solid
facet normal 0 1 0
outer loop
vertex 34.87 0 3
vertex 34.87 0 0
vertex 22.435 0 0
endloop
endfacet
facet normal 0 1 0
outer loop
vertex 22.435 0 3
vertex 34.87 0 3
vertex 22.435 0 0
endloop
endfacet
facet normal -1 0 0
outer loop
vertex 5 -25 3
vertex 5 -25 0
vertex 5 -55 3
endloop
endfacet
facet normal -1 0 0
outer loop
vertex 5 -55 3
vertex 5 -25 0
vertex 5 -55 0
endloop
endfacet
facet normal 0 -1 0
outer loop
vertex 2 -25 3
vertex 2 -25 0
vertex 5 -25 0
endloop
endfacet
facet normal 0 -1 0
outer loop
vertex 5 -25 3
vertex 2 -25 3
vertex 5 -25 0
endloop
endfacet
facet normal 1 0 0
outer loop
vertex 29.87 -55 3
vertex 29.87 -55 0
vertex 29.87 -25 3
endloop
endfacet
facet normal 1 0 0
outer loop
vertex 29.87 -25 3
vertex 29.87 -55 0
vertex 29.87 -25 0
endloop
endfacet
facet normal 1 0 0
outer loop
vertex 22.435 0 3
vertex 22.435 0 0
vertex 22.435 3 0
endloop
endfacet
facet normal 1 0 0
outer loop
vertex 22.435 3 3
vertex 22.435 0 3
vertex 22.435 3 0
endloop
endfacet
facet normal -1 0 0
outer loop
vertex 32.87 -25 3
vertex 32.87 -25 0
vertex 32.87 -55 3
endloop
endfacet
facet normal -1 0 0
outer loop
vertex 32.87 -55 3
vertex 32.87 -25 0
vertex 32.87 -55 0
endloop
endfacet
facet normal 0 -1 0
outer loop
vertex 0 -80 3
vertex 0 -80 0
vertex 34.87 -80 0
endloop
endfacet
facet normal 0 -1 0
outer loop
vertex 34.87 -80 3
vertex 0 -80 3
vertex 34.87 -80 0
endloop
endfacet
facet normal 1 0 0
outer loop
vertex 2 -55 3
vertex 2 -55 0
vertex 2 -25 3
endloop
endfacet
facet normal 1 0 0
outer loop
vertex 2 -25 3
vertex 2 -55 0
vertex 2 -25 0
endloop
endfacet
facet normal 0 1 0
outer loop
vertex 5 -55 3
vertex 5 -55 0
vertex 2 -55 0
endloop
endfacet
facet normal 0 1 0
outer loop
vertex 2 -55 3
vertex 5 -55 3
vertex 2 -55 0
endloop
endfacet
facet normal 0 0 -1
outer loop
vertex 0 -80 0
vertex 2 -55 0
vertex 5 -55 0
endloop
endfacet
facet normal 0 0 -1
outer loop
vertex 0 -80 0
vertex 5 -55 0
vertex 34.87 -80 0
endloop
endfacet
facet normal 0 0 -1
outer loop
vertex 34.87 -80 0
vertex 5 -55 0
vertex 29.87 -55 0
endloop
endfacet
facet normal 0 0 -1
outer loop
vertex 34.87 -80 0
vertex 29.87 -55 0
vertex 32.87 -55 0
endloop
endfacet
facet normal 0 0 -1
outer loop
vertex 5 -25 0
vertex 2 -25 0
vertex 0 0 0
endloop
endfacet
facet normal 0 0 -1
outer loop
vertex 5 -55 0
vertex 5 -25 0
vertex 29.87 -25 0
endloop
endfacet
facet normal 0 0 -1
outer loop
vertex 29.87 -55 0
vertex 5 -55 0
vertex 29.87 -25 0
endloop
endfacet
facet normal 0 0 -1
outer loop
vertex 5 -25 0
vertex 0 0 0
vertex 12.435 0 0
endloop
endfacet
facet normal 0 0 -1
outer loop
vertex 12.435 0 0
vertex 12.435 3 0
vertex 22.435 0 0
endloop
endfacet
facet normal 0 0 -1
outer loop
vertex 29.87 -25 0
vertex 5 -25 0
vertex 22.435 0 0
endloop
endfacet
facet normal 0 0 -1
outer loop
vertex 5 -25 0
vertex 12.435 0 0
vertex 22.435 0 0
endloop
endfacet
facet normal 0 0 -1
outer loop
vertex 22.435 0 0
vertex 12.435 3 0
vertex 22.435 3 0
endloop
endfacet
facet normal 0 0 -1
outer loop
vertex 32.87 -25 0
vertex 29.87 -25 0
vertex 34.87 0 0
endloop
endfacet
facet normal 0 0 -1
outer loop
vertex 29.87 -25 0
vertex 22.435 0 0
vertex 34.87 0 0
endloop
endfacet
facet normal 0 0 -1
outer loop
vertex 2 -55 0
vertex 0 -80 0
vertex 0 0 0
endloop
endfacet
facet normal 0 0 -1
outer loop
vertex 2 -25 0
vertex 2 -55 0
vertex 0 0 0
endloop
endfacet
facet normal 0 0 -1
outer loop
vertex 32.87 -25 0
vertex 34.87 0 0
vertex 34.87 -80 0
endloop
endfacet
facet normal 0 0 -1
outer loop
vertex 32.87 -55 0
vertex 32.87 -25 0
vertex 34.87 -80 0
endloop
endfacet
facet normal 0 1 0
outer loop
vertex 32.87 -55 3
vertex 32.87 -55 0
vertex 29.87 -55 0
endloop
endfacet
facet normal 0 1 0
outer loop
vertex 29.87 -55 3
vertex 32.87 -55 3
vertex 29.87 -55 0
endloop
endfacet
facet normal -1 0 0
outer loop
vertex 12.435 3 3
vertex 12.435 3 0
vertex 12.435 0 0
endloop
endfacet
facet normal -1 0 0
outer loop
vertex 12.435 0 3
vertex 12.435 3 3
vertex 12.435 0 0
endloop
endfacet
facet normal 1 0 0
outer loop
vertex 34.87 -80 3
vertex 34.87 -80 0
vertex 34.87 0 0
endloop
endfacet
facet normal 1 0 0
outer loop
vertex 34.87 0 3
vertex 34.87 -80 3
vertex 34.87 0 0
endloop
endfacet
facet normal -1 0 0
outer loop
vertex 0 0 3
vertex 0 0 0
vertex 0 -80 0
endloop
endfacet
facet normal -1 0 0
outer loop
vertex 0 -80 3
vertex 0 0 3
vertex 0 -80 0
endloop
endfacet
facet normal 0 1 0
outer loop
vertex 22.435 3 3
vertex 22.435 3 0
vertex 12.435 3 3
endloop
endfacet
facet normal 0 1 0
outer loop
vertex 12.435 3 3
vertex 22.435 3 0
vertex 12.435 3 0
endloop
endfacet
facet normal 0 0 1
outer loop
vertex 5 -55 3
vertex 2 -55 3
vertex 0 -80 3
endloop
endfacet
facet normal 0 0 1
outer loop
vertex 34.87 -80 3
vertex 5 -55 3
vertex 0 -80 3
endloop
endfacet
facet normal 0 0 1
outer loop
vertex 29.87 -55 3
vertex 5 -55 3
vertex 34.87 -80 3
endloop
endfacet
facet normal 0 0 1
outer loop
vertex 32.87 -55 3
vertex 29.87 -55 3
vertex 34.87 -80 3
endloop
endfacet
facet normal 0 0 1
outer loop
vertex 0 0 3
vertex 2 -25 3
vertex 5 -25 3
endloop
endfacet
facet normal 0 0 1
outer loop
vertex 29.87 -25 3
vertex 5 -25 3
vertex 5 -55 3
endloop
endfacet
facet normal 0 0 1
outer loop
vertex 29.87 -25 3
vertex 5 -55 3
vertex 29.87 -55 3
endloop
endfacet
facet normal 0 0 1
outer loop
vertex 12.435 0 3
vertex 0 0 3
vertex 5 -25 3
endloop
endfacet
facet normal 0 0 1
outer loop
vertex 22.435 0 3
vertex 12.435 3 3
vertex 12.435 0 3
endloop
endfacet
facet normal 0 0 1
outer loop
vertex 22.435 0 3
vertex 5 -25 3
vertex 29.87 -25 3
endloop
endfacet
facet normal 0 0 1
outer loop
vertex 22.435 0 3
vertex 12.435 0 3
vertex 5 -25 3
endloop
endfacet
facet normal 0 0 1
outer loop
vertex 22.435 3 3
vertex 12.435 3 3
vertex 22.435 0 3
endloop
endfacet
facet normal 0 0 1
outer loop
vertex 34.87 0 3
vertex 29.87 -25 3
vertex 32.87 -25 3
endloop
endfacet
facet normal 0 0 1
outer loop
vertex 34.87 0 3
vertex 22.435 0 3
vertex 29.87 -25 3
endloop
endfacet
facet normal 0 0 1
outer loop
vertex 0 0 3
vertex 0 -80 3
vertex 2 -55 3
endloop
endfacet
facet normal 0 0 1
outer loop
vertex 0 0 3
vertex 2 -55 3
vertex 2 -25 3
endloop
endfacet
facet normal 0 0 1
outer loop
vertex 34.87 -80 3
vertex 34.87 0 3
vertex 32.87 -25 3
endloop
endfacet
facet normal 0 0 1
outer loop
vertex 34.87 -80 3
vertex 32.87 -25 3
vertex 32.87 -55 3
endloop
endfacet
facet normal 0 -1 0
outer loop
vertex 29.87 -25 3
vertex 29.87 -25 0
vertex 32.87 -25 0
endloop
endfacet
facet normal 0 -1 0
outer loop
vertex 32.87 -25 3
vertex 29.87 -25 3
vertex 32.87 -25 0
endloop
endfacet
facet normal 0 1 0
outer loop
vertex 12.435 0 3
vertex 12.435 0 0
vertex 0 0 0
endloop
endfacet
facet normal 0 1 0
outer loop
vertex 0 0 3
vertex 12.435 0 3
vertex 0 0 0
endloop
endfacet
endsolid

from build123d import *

# Parameters (mm, degrees)
EXTRUDE_1_DEPTH = 3


with BuildPart() as part:
    # 草图1 → 凸台-拉伸1 (new body)
    with BuildSketch(Plane.XY):
        Polygon((0, 0), (0, -40), (2, -40), (2, -25), (5, -25), (5, -40), (17.435, -40), (17.435, 0), (12.435, 0), align=None)
        Polygon((2, -40), (0, -40), (0, -80), (17.435, -80), (17.435, -40), (5, -40), (5, -55), (2, -55), align=None)
        Polygon((17.435, -40), (17.435, -80), (34.87, -80), (34.87, -40), (32.87, -40), (32.87, -55), (29.87, -55), (29.87, -40), align=None)
        Polygon((17.435, 0), (17.435, -40), (29.87, -40), (29.87, -25), (32.87, -25), (32.87, -40), (34.87, -40), (34.87, 0), (22.435, 0), align=None)
        Polygon((12.435, 3), (12.435, 0), (17.435, 0), (22.435, 0), (22.435, 3), align=None)
    extrude(amount=EXTRUDE_1_DEPTH)


solid = part.part
